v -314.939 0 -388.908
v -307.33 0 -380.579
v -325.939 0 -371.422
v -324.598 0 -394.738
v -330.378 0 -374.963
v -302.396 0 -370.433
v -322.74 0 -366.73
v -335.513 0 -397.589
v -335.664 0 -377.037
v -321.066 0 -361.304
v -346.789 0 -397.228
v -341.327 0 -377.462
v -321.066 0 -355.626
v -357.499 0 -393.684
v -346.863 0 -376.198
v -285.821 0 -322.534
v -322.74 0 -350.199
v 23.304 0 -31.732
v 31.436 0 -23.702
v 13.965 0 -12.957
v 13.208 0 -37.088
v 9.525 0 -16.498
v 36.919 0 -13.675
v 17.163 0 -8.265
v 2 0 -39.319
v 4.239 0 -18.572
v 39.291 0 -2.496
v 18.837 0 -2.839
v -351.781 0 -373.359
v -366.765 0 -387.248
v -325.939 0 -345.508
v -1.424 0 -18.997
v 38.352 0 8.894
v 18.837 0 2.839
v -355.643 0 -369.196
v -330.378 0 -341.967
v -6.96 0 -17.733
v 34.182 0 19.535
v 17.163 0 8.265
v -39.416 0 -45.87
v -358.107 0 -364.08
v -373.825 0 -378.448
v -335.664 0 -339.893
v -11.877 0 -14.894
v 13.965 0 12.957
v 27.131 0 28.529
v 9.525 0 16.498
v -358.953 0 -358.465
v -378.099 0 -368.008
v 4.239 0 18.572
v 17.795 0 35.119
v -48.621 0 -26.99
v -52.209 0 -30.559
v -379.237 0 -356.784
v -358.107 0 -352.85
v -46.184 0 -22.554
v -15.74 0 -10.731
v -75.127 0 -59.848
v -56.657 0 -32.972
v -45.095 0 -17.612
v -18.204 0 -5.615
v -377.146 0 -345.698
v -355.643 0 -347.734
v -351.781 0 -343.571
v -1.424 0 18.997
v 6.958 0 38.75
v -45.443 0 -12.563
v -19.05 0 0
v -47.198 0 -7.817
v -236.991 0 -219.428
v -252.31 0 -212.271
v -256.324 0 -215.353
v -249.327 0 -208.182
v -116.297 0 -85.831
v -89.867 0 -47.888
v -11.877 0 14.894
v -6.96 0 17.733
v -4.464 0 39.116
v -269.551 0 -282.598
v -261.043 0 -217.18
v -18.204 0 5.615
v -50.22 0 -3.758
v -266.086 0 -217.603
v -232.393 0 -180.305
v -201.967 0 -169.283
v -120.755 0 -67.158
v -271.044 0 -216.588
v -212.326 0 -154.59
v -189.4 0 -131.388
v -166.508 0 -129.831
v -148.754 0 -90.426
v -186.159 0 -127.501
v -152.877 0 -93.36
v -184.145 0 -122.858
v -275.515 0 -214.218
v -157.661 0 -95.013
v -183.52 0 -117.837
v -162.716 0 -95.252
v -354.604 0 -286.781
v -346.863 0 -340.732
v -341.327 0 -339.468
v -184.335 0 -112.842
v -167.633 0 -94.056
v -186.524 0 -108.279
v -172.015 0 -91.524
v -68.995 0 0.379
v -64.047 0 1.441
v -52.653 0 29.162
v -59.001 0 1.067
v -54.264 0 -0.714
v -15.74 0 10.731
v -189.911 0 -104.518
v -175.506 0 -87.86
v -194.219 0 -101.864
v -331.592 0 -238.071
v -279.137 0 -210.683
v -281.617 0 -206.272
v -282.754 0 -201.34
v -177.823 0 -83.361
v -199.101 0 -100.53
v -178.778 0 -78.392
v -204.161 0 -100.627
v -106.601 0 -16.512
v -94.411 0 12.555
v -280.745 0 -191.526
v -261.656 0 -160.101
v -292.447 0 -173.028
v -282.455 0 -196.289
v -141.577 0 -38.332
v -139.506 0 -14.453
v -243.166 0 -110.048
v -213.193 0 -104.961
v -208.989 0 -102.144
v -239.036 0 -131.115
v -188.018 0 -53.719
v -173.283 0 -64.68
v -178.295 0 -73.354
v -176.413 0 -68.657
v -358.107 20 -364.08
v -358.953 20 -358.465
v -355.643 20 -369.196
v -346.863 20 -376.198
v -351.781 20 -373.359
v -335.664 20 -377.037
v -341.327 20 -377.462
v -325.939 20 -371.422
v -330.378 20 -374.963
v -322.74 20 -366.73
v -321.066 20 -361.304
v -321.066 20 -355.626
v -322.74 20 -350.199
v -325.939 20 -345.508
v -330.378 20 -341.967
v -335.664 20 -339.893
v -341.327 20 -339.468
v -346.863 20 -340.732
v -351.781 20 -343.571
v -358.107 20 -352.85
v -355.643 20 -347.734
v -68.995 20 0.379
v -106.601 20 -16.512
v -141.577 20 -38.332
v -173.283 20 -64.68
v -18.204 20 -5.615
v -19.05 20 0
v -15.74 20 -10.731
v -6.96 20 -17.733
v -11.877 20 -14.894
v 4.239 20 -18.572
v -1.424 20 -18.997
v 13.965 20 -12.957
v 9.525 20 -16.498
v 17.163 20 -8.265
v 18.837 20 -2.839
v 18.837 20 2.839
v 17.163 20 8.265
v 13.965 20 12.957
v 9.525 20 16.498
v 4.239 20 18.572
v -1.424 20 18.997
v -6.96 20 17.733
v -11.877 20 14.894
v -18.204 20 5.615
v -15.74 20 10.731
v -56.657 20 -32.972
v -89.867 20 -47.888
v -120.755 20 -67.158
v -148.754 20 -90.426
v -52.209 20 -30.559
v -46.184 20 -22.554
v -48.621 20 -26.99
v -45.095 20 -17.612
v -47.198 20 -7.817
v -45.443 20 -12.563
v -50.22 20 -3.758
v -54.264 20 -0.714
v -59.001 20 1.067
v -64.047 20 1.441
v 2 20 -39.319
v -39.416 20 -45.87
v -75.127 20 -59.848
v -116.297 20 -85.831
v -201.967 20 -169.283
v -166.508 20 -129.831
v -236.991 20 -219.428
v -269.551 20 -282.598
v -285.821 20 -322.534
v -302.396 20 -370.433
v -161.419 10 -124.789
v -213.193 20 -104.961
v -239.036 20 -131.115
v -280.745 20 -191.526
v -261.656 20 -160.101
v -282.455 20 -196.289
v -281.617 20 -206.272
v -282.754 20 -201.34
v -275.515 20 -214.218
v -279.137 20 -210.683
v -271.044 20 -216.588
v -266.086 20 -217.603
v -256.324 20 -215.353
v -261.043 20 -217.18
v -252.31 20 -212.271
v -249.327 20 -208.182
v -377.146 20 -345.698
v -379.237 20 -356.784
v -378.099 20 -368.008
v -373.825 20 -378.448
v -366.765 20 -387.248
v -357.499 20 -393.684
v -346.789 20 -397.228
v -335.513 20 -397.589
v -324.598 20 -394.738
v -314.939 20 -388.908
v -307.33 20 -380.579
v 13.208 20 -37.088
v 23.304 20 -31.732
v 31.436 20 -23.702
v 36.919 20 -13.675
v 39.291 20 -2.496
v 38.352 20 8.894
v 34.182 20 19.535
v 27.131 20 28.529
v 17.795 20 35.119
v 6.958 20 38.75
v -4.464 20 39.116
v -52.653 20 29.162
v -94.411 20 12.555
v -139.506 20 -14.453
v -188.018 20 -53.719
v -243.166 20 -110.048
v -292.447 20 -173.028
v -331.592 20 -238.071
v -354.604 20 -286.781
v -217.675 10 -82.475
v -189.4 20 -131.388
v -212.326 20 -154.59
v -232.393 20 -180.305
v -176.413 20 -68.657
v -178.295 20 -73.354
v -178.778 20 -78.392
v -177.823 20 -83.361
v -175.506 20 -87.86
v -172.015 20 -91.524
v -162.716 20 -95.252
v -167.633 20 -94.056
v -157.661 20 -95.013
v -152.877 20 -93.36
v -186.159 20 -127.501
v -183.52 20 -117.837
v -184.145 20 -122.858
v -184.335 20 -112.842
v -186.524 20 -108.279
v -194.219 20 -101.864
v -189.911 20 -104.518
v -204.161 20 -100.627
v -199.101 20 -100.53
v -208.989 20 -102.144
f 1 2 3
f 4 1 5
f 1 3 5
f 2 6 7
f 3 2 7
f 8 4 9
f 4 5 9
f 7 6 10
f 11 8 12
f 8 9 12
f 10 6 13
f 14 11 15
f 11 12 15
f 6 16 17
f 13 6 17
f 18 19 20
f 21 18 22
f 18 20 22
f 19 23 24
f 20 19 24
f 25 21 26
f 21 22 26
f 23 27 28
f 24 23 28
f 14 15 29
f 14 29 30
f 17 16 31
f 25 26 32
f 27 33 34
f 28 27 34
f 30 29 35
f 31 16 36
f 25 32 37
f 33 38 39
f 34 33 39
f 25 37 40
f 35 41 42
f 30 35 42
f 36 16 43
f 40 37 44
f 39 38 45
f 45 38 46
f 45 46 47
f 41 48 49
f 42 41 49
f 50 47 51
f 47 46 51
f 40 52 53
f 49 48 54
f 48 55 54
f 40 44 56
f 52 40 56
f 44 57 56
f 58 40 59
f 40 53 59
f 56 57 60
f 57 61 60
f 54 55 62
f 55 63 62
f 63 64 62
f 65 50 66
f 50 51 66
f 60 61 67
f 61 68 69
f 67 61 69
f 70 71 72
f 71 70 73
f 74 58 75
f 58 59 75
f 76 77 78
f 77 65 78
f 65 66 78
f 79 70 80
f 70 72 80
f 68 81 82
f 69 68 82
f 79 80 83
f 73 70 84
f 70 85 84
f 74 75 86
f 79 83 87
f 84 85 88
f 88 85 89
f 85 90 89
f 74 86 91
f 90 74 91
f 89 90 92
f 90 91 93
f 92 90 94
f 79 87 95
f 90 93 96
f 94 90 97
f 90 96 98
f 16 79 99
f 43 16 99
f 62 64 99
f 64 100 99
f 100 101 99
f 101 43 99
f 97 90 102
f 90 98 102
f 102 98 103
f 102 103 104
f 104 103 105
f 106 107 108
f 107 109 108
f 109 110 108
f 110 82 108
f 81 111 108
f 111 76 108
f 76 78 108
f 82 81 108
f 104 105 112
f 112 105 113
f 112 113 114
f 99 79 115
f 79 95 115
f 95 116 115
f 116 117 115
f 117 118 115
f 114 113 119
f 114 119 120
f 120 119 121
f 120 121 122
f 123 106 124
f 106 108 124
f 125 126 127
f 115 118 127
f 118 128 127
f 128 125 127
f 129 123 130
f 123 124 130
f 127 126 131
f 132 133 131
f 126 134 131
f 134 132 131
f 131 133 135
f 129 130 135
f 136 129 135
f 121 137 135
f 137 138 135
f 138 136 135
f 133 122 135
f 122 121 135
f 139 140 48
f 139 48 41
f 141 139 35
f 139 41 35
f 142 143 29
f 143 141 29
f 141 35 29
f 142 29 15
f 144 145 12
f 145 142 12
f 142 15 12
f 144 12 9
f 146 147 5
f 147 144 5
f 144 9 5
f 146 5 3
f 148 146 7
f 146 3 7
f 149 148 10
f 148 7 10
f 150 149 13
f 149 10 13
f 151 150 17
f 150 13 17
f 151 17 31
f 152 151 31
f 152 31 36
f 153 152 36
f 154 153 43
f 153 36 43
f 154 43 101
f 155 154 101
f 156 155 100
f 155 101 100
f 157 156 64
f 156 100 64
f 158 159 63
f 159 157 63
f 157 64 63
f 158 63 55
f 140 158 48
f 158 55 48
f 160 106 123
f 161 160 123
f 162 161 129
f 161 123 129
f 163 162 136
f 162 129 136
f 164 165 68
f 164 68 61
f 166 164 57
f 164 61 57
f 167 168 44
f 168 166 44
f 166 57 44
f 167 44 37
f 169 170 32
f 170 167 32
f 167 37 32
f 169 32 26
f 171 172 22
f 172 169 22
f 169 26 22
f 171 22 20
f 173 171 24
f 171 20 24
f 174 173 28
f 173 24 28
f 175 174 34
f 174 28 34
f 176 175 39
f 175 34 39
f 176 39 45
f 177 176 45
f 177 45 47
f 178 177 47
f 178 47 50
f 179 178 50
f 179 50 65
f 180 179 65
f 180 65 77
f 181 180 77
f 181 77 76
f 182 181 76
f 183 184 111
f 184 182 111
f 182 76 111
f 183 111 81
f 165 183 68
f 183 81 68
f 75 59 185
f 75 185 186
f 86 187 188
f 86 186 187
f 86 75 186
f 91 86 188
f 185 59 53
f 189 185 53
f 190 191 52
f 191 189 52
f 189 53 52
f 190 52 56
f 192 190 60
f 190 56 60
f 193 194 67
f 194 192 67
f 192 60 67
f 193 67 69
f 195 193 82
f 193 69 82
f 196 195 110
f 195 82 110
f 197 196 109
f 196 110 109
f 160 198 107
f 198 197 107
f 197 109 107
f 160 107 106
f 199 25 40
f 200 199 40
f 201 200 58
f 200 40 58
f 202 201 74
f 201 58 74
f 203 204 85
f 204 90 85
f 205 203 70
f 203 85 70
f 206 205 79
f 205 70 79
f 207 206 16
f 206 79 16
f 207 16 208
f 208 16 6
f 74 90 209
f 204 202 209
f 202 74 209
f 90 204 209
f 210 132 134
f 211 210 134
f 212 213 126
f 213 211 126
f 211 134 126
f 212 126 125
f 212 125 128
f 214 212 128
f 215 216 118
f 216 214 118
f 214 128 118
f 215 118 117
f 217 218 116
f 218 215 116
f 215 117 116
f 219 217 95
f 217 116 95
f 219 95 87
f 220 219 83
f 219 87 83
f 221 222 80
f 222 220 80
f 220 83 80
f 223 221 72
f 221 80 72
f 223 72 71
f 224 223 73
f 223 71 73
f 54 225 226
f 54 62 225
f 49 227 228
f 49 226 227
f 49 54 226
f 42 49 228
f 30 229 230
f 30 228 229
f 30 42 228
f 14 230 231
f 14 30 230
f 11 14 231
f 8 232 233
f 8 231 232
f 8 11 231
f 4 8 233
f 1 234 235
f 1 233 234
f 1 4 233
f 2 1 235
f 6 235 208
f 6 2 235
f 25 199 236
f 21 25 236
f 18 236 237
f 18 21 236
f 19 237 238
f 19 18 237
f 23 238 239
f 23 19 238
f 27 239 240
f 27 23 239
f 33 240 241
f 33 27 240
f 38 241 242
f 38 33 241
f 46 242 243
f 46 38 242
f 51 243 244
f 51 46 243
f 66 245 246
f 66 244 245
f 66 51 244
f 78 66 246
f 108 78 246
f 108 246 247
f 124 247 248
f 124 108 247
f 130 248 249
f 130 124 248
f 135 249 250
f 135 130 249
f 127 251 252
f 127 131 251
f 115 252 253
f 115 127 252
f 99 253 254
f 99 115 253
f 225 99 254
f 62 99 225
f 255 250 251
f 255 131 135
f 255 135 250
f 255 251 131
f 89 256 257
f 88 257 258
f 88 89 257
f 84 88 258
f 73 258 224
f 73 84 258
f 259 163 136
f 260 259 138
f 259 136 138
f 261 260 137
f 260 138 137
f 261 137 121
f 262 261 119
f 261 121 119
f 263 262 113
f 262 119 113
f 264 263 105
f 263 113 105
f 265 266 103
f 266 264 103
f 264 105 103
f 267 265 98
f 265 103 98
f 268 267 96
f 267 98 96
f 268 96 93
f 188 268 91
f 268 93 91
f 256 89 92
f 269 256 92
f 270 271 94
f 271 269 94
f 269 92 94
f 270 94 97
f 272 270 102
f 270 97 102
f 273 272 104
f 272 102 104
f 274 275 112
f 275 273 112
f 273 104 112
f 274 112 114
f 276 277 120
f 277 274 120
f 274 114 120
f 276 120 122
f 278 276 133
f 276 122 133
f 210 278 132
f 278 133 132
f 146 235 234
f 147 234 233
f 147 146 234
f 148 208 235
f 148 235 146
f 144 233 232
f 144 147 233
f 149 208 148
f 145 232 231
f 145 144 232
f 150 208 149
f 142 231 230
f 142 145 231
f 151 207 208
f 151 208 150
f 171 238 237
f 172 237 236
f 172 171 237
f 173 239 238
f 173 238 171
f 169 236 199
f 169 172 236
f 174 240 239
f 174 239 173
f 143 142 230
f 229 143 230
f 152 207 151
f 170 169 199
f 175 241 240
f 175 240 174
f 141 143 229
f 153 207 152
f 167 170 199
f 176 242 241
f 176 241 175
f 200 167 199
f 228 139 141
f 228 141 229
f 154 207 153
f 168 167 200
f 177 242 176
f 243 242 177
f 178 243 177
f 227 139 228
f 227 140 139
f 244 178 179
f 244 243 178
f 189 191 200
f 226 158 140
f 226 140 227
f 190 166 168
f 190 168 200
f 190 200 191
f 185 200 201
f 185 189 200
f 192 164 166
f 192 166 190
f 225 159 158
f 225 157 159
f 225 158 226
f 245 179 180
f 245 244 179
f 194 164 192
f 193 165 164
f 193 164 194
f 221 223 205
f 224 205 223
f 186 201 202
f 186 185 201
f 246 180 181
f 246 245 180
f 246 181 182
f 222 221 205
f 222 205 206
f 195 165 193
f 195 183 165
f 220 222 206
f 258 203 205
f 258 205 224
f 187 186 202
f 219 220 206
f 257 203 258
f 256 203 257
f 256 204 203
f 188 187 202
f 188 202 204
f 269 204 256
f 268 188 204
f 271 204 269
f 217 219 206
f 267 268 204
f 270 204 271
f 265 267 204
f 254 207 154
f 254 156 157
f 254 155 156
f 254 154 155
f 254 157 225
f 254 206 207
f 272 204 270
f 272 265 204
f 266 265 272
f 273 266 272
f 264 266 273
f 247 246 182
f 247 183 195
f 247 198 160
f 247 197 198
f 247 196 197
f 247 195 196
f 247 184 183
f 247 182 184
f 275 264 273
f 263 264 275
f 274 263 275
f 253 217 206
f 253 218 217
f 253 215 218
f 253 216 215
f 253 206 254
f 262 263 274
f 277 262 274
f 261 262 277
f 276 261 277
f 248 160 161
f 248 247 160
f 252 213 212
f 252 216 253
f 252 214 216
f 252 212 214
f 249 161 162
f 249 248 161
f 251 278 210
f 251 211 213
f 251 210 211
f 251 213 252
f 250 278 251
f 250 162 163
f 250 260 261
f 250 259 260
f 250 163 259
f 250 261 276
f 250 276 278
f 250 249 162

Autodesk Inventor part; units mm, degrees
ref_plane "YZ Plane" through (0, 0, 0) normal (1, 0, 0) x (0, 1, 0)
ref_plane "XZ Plane" through (0, 0, 0) normal (0, 1, 0) x (-1, 0, 0)
ref_plane "XY Plane" through (0, 0, 0) normal (0, 0, 1) x (1, 0, 0)
sketch "Sketch1" plane through (0, 0, 0) normal (0, 1, 0) x (-1, 0, 0)
  circle A0 centre (0, 0) radius 19.05
  arc A1 (4.4642, 39.1161) -> (-1.9997, -39.3192) centre (0, 0) ccw
  line L0 (-1.9997, -39.3192) -> (49.0185, -41.9138) construction
  line L1 (263.1315, -247.3812) -> (302.3964, -370.4331) construction
  spline S0 degree 4 poles (-1.9997, -39.3192) (49.0185, -41.9138) (105.6374, -72.1982) (173.8913, -120.1961) (263.1315, -247.3812) (302.3964, -370.4331) knots 1 1 1 1 1 1.581444 2 2 2 2 2
  line L2 (4.4642, 39.1161) -> (78.1887, 30.7022) construction
  line L3 (339.9032, -237.0622) -> (377.1456, -345.6975) construction
  spline S1 degree 4 poles (4.4642, 39.1161) (78.1887, 30.7022) (179.8099, -32.9721) (261.2925, -118.1743) (339.9032, -237.0622) (377.1456, -345.6975) knots 0 0 0 0 0 1 2 2 2 2 2
  circle A2 centre (339.9032, -358.4649) radius 19.05
  arc A3 (302.3964, -370.4331) -> (377.1456, -345.6975) centre (339.9032, -358.4649) ccw
  circle A4 centre (339.9032, -358.4649) radius 15.8726 construction
  arc A5 (265.0359, -199.854) -> (201.2966, -118.1743) centre (2.3813, -339.1088) ccw construction
  arc A6 (280.7447, -191.5256) -> (213.1932, -104.9608) centre (2.3813, -339.1088) ccw
  arc A7 (249.3272, -208.1825) -> (189.3999, -131.3879) centre (2.3813, -339.1088) ccw
  arc A8 (249.3272, -208.1825) -> (280.7447, -191.5256) centre (265.0359, -199.854) ccw
  arc A9 (213.1932, -104.9608) -> (189.3999, -131.3879) centre (201.2966, -118.1743) ccw
  arc A10 (161.0182, -77.5529) -> (62.8262, -16.2966) centre (-36.5592, -284.9364) ccw construction
  arc A11 (173.2826, -64.6798) -> (68.9954, 0.3788) centre (-36.5592, -284.9364) ccw
  arc A12 (148.7539, -90.4259) -> (56.657, -32.9721) centre (-36.5592, -284.9364) ccw
  arc A13 (148.7539, -90.4259) -> (173.2826, -64.6798) centre (161.0182, -77.5529) ccw
  arc A14 (68.9954, 0.3788) -> (56.657, -32.9721) centre (62.8262, -16.2966) ccw
  line L4 (78.1887, 30.7022) -> (179.8099, -32.9721) construction
  line L5 (179.8099, -32.9721) -> (261.2925, -118.1743) construction
  line L6 (261.2925, -118.1743) -> (339.9032, -237.0622) construction
  line L7 (49.0185, -41.9138) -> (105.6374, -72.1982) construction
  line L8 (105.6374, -72.1982) -> (173.8913, -120.1961) construction
  line L9 (173.8913, -120.1961) -> (263.1315, -247.3812) construction
  dimension "d0" = 38.1
  dimension "d1" = 20.32
  dimension "d2" = 38.1
  dimension "d3" = 20.32
  dimension "d6" = 17.78
  dimension "d7" = 17.78
extrude "Extrusion1" add sketch "Sketch1" along normal blind 20
equation "\"d1\" = d3"
equation "\"d2\" = d0"
equation "\"d7\" = d6"
properties part number "Profile" material "Aluminum 6061"
